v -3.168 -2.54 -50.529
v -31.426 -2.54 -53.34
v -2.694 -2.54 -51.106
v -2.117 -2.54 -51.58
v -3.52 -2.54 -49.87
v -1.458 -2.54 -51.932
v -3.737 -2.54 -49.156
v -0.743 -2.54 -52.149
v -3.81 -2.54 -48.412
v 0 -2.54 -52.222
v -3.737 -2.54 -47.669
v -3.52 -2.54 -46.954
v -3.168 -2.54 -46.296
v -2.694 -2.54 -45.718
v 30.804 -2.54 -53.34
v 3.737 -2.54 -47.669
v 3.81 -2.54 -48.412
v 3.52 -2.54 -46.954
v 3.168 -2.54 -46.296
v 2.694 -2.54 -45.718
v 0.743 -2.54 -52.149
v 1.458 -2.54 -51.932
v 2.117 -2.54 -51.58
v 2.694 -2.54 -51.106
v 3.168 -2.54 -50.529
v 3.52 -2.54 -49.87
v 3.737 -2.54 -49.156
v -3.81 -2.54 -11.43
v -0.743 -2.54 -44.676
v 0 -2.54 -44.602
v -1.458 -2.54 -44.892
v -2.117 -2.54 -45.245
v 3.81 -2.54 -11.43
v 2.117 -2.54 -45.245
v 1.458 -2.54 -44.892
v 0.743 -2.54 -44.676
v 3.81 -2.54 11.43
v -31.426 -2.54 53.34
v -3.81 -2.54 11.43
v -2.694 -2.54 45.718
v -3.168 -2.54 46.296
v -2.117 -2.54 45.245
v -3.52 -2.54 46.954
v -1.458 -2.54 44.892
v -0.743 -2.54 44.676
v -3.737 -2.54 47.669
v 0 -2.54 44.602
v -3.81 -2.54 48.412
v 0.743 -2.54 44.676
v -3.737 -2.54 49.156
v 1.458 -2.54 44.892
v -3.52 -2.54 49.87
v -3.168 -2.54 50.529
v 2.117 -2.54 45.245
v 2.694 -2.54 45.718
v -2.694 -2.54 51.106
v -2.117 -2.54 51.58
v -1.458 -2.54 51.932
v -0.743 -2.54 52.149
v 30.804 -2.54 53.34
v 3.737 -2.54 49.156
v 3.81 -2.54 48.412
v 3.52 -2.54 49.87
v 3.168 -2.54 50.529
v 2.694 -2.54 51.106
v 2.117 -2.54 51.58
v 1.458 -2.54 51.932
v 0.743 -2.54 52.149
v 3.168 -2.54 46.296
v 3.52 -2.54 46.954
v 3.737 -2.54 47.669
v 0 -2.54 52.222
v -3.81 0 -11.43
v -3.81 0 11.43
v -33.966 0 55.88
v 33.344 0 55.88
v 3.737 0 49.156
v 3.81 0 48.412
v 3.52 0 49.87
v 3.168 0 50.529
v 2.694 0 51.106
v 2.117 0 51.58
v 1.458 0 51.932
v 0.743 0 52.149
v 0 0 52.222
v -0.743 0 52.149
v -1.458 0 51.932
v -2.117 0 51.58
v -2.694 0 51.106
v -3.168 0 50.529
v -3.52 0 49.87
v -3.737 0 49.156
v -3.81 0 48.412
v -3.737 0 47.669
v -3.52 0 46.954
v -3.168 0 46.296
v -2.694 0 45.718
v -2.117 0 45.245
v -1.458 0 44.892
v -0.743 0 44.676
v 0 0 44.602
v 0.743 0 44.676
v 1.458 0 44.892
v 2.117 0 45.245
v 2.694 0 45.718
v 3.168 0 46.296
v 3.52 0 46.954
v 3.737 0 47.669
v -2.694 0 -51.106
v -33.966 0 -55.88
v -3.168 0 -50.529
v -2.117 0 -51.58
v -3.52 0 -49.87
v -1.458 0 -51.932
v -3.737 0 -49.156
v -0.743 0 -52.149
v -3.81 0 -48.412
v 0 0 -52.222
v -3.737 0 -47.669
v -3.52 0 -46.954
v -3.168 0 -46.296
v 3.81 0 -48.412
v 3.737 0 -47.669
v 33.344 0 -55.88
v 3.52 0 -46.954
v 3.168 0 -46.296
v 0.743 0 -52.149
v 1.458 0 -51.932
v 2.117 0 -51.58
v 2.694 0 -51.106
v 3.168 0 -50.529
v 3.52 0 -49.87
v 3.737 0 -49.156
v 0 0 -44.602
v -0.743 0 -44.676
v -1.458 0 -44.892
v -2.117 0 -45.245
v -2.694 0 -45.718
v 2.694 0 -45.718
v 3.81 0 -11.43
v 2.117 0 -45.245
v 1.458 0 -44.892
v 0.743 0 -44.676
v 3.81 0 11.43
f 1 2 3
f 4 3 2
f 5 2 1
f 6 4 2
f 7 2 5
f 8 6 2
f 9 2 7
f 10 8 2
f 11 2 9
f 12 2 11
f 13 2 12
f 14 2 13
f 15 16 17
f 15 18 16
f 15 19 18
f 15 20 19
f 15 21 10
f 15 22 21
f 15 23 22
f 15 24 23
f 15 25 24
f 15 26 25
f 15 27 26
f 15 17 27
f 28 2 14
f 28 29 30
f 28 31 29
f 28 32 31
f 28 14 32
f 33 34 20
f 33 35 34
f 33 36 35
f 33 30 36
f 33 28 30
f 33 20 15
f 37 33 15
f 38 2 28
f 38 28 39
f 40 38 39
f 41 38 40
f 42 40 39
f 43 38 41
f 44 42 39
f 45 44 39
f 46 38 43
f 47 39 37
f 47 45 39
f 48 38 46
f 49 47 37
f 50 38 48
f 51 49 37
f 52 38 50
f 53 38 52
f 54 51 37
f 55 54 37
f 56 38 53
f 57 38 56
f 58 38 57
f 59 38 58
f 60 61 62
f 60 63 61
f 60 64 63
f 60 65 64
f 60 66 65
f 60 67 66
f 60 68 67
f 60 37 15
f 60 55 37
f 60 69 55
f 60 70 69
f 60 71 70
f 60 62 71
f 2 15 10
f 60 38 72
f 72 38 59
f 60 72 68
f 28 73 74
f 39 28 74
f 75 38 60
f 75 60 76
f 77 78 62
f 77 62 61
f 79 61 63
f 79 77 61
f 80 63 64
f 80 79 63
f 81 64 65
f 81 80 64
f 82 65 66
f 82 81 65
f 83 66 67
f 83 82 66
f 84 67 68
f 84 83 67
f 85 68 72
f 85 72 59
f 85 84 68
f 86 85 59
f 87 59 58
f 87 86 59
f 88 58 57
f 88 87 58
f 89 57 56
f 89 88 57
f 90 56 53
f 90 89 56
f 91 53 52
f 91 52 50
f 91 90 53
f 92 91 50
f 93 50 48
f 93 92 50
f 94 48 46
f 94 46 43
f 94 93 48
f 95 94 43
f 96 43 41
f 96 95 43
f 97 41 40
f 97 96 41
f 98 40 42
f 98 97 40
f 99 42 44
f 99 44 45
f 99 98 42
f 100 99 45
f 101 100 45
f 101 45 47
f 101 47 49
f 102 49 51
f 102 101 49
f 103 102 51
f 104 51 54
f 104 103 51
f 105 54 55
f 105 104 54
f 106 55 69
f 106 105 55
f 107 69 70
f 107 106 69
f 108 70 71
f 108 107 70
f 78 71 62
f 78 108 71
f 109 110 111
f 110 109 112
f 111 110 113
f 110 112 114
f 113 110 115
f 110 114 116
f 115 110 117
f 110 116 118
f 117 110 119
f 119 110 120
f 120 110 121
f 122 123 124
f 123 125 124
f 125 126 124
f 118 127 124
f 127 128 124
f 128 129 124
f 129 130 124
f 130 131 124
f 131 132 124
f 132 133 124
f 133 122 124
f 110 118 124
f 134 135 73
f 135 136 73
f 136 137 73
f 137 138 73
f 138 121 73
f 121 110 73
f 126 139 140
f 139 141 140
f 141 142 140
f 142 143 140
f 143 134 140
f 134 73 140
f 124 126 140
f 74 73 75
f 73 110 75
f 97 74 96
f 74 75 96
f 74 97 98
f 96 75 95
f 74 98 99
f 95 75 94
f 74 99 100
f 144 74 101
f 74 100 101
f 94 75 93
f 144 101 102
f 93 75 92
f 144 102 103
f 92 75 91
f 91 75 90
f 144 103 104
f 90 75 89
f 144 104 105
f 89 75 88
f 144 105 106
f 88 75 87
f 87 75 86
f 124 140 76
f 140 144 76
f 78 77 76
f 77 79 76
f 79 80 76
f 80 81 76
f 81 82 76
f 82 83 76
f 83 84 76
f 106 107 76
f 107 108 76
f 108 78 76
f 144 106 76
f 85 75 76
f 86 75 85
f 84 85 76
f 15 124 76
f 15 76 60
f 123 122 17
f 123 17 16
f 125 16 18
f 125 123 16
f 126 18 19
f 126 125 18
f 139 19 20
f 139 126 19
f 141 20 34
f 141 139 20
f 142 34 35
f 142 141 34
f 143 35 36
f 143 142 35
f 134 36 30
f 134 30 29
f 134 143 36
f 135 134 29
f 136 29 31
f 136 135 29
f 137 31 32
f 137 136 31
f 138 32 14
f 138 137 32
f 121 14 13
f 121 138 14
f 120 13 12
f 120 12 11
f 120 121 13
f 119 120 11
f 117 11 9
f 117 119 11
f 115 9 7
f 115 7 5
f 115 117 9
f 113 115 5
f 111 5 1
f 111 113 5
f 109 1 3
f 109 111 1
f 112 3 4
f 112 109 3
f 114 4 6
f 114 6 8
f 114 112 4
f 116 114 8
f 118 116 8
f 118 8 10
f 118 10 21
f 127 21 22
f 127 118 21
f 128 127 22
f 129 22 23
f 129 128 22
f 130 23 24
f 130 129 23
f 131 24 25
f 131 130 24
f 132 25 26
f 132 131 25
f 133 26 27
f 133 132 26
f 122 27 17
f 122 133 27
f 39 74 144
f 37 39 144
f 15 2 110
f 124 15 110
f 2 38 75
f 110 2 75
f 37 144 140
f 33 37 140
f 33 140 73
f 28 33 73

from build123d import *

# Parameters (mm, degrees)
F0_W        = 69.85
F0_H        = 114.3
F0_R        = 3.81
F1_DEPTH    = 2.54
F2_T1_DEPTH = 89.4462243683
F2_T3_DEPTH = 133.8962243683


# Not quite as in the source:
# - a fillet or chamfer that OpenCascade refuses, or shapes differently, is made with other operations: its cross-section is extruded or revolved along the edge and cut away or added


with BuildPart() as f1:
    # F0 (on Front) → F1 (new body)
    with BuildSketch(Plane.XZ):
        with Locations((-0.3112182021, 0)):
            Rectangle(F0_W, F0_H)
        with Locations((0, -48.4124)):
            Circle(F0_R, mode=Mode.SUBTRACT)
        Polygon((-3.81, 11.43), (0, 11.43), (3.81, 11.43), (3.81, -11.43), (-3.81, -11.43), align=None, mode=Mode.SUBTRACT)
        with Locations((0, 48.4124)):
            Circle(F0_R, mode=Mode.SUBTRACT)
    extrude(amount=F1_DEPTH)

    # F2: chamfer of 3.81 on 4 edges, made by hand

    # F2_s2 → F2_t1 (cut)
    with BuildSketch(Plane.YZ.offset(-45.0343303863)):
        Polygon((-2.54, 53.34), (1.27, 57.15), (-2.54, 57.15), align=None)
        Polygon((-2.54, -53.34), (1.27, -57.15), (-2.54, -57.15), align=None)
    extrude(amount=F2_T1_DEPTH, mode=Mode.SUBTRACT)

    # F2_s4 → F2_t3 (cut)
    with BuildSketch(Plane.XY.offset(-66.9481121842)):
        Polygon((-31.4262182021, -2.54), (-35.2362182021, 1.27), (-35.2362182021, -2.54), align=None)
        Polygon((34.6137817979, 1.27), (30.8037817979, -2.54), (34.6137817979, -2.54), align=None)
    extrude(amount=F2_T3_DEPTH, mode=Mode.SUBTRACT)


solid = f1.part
